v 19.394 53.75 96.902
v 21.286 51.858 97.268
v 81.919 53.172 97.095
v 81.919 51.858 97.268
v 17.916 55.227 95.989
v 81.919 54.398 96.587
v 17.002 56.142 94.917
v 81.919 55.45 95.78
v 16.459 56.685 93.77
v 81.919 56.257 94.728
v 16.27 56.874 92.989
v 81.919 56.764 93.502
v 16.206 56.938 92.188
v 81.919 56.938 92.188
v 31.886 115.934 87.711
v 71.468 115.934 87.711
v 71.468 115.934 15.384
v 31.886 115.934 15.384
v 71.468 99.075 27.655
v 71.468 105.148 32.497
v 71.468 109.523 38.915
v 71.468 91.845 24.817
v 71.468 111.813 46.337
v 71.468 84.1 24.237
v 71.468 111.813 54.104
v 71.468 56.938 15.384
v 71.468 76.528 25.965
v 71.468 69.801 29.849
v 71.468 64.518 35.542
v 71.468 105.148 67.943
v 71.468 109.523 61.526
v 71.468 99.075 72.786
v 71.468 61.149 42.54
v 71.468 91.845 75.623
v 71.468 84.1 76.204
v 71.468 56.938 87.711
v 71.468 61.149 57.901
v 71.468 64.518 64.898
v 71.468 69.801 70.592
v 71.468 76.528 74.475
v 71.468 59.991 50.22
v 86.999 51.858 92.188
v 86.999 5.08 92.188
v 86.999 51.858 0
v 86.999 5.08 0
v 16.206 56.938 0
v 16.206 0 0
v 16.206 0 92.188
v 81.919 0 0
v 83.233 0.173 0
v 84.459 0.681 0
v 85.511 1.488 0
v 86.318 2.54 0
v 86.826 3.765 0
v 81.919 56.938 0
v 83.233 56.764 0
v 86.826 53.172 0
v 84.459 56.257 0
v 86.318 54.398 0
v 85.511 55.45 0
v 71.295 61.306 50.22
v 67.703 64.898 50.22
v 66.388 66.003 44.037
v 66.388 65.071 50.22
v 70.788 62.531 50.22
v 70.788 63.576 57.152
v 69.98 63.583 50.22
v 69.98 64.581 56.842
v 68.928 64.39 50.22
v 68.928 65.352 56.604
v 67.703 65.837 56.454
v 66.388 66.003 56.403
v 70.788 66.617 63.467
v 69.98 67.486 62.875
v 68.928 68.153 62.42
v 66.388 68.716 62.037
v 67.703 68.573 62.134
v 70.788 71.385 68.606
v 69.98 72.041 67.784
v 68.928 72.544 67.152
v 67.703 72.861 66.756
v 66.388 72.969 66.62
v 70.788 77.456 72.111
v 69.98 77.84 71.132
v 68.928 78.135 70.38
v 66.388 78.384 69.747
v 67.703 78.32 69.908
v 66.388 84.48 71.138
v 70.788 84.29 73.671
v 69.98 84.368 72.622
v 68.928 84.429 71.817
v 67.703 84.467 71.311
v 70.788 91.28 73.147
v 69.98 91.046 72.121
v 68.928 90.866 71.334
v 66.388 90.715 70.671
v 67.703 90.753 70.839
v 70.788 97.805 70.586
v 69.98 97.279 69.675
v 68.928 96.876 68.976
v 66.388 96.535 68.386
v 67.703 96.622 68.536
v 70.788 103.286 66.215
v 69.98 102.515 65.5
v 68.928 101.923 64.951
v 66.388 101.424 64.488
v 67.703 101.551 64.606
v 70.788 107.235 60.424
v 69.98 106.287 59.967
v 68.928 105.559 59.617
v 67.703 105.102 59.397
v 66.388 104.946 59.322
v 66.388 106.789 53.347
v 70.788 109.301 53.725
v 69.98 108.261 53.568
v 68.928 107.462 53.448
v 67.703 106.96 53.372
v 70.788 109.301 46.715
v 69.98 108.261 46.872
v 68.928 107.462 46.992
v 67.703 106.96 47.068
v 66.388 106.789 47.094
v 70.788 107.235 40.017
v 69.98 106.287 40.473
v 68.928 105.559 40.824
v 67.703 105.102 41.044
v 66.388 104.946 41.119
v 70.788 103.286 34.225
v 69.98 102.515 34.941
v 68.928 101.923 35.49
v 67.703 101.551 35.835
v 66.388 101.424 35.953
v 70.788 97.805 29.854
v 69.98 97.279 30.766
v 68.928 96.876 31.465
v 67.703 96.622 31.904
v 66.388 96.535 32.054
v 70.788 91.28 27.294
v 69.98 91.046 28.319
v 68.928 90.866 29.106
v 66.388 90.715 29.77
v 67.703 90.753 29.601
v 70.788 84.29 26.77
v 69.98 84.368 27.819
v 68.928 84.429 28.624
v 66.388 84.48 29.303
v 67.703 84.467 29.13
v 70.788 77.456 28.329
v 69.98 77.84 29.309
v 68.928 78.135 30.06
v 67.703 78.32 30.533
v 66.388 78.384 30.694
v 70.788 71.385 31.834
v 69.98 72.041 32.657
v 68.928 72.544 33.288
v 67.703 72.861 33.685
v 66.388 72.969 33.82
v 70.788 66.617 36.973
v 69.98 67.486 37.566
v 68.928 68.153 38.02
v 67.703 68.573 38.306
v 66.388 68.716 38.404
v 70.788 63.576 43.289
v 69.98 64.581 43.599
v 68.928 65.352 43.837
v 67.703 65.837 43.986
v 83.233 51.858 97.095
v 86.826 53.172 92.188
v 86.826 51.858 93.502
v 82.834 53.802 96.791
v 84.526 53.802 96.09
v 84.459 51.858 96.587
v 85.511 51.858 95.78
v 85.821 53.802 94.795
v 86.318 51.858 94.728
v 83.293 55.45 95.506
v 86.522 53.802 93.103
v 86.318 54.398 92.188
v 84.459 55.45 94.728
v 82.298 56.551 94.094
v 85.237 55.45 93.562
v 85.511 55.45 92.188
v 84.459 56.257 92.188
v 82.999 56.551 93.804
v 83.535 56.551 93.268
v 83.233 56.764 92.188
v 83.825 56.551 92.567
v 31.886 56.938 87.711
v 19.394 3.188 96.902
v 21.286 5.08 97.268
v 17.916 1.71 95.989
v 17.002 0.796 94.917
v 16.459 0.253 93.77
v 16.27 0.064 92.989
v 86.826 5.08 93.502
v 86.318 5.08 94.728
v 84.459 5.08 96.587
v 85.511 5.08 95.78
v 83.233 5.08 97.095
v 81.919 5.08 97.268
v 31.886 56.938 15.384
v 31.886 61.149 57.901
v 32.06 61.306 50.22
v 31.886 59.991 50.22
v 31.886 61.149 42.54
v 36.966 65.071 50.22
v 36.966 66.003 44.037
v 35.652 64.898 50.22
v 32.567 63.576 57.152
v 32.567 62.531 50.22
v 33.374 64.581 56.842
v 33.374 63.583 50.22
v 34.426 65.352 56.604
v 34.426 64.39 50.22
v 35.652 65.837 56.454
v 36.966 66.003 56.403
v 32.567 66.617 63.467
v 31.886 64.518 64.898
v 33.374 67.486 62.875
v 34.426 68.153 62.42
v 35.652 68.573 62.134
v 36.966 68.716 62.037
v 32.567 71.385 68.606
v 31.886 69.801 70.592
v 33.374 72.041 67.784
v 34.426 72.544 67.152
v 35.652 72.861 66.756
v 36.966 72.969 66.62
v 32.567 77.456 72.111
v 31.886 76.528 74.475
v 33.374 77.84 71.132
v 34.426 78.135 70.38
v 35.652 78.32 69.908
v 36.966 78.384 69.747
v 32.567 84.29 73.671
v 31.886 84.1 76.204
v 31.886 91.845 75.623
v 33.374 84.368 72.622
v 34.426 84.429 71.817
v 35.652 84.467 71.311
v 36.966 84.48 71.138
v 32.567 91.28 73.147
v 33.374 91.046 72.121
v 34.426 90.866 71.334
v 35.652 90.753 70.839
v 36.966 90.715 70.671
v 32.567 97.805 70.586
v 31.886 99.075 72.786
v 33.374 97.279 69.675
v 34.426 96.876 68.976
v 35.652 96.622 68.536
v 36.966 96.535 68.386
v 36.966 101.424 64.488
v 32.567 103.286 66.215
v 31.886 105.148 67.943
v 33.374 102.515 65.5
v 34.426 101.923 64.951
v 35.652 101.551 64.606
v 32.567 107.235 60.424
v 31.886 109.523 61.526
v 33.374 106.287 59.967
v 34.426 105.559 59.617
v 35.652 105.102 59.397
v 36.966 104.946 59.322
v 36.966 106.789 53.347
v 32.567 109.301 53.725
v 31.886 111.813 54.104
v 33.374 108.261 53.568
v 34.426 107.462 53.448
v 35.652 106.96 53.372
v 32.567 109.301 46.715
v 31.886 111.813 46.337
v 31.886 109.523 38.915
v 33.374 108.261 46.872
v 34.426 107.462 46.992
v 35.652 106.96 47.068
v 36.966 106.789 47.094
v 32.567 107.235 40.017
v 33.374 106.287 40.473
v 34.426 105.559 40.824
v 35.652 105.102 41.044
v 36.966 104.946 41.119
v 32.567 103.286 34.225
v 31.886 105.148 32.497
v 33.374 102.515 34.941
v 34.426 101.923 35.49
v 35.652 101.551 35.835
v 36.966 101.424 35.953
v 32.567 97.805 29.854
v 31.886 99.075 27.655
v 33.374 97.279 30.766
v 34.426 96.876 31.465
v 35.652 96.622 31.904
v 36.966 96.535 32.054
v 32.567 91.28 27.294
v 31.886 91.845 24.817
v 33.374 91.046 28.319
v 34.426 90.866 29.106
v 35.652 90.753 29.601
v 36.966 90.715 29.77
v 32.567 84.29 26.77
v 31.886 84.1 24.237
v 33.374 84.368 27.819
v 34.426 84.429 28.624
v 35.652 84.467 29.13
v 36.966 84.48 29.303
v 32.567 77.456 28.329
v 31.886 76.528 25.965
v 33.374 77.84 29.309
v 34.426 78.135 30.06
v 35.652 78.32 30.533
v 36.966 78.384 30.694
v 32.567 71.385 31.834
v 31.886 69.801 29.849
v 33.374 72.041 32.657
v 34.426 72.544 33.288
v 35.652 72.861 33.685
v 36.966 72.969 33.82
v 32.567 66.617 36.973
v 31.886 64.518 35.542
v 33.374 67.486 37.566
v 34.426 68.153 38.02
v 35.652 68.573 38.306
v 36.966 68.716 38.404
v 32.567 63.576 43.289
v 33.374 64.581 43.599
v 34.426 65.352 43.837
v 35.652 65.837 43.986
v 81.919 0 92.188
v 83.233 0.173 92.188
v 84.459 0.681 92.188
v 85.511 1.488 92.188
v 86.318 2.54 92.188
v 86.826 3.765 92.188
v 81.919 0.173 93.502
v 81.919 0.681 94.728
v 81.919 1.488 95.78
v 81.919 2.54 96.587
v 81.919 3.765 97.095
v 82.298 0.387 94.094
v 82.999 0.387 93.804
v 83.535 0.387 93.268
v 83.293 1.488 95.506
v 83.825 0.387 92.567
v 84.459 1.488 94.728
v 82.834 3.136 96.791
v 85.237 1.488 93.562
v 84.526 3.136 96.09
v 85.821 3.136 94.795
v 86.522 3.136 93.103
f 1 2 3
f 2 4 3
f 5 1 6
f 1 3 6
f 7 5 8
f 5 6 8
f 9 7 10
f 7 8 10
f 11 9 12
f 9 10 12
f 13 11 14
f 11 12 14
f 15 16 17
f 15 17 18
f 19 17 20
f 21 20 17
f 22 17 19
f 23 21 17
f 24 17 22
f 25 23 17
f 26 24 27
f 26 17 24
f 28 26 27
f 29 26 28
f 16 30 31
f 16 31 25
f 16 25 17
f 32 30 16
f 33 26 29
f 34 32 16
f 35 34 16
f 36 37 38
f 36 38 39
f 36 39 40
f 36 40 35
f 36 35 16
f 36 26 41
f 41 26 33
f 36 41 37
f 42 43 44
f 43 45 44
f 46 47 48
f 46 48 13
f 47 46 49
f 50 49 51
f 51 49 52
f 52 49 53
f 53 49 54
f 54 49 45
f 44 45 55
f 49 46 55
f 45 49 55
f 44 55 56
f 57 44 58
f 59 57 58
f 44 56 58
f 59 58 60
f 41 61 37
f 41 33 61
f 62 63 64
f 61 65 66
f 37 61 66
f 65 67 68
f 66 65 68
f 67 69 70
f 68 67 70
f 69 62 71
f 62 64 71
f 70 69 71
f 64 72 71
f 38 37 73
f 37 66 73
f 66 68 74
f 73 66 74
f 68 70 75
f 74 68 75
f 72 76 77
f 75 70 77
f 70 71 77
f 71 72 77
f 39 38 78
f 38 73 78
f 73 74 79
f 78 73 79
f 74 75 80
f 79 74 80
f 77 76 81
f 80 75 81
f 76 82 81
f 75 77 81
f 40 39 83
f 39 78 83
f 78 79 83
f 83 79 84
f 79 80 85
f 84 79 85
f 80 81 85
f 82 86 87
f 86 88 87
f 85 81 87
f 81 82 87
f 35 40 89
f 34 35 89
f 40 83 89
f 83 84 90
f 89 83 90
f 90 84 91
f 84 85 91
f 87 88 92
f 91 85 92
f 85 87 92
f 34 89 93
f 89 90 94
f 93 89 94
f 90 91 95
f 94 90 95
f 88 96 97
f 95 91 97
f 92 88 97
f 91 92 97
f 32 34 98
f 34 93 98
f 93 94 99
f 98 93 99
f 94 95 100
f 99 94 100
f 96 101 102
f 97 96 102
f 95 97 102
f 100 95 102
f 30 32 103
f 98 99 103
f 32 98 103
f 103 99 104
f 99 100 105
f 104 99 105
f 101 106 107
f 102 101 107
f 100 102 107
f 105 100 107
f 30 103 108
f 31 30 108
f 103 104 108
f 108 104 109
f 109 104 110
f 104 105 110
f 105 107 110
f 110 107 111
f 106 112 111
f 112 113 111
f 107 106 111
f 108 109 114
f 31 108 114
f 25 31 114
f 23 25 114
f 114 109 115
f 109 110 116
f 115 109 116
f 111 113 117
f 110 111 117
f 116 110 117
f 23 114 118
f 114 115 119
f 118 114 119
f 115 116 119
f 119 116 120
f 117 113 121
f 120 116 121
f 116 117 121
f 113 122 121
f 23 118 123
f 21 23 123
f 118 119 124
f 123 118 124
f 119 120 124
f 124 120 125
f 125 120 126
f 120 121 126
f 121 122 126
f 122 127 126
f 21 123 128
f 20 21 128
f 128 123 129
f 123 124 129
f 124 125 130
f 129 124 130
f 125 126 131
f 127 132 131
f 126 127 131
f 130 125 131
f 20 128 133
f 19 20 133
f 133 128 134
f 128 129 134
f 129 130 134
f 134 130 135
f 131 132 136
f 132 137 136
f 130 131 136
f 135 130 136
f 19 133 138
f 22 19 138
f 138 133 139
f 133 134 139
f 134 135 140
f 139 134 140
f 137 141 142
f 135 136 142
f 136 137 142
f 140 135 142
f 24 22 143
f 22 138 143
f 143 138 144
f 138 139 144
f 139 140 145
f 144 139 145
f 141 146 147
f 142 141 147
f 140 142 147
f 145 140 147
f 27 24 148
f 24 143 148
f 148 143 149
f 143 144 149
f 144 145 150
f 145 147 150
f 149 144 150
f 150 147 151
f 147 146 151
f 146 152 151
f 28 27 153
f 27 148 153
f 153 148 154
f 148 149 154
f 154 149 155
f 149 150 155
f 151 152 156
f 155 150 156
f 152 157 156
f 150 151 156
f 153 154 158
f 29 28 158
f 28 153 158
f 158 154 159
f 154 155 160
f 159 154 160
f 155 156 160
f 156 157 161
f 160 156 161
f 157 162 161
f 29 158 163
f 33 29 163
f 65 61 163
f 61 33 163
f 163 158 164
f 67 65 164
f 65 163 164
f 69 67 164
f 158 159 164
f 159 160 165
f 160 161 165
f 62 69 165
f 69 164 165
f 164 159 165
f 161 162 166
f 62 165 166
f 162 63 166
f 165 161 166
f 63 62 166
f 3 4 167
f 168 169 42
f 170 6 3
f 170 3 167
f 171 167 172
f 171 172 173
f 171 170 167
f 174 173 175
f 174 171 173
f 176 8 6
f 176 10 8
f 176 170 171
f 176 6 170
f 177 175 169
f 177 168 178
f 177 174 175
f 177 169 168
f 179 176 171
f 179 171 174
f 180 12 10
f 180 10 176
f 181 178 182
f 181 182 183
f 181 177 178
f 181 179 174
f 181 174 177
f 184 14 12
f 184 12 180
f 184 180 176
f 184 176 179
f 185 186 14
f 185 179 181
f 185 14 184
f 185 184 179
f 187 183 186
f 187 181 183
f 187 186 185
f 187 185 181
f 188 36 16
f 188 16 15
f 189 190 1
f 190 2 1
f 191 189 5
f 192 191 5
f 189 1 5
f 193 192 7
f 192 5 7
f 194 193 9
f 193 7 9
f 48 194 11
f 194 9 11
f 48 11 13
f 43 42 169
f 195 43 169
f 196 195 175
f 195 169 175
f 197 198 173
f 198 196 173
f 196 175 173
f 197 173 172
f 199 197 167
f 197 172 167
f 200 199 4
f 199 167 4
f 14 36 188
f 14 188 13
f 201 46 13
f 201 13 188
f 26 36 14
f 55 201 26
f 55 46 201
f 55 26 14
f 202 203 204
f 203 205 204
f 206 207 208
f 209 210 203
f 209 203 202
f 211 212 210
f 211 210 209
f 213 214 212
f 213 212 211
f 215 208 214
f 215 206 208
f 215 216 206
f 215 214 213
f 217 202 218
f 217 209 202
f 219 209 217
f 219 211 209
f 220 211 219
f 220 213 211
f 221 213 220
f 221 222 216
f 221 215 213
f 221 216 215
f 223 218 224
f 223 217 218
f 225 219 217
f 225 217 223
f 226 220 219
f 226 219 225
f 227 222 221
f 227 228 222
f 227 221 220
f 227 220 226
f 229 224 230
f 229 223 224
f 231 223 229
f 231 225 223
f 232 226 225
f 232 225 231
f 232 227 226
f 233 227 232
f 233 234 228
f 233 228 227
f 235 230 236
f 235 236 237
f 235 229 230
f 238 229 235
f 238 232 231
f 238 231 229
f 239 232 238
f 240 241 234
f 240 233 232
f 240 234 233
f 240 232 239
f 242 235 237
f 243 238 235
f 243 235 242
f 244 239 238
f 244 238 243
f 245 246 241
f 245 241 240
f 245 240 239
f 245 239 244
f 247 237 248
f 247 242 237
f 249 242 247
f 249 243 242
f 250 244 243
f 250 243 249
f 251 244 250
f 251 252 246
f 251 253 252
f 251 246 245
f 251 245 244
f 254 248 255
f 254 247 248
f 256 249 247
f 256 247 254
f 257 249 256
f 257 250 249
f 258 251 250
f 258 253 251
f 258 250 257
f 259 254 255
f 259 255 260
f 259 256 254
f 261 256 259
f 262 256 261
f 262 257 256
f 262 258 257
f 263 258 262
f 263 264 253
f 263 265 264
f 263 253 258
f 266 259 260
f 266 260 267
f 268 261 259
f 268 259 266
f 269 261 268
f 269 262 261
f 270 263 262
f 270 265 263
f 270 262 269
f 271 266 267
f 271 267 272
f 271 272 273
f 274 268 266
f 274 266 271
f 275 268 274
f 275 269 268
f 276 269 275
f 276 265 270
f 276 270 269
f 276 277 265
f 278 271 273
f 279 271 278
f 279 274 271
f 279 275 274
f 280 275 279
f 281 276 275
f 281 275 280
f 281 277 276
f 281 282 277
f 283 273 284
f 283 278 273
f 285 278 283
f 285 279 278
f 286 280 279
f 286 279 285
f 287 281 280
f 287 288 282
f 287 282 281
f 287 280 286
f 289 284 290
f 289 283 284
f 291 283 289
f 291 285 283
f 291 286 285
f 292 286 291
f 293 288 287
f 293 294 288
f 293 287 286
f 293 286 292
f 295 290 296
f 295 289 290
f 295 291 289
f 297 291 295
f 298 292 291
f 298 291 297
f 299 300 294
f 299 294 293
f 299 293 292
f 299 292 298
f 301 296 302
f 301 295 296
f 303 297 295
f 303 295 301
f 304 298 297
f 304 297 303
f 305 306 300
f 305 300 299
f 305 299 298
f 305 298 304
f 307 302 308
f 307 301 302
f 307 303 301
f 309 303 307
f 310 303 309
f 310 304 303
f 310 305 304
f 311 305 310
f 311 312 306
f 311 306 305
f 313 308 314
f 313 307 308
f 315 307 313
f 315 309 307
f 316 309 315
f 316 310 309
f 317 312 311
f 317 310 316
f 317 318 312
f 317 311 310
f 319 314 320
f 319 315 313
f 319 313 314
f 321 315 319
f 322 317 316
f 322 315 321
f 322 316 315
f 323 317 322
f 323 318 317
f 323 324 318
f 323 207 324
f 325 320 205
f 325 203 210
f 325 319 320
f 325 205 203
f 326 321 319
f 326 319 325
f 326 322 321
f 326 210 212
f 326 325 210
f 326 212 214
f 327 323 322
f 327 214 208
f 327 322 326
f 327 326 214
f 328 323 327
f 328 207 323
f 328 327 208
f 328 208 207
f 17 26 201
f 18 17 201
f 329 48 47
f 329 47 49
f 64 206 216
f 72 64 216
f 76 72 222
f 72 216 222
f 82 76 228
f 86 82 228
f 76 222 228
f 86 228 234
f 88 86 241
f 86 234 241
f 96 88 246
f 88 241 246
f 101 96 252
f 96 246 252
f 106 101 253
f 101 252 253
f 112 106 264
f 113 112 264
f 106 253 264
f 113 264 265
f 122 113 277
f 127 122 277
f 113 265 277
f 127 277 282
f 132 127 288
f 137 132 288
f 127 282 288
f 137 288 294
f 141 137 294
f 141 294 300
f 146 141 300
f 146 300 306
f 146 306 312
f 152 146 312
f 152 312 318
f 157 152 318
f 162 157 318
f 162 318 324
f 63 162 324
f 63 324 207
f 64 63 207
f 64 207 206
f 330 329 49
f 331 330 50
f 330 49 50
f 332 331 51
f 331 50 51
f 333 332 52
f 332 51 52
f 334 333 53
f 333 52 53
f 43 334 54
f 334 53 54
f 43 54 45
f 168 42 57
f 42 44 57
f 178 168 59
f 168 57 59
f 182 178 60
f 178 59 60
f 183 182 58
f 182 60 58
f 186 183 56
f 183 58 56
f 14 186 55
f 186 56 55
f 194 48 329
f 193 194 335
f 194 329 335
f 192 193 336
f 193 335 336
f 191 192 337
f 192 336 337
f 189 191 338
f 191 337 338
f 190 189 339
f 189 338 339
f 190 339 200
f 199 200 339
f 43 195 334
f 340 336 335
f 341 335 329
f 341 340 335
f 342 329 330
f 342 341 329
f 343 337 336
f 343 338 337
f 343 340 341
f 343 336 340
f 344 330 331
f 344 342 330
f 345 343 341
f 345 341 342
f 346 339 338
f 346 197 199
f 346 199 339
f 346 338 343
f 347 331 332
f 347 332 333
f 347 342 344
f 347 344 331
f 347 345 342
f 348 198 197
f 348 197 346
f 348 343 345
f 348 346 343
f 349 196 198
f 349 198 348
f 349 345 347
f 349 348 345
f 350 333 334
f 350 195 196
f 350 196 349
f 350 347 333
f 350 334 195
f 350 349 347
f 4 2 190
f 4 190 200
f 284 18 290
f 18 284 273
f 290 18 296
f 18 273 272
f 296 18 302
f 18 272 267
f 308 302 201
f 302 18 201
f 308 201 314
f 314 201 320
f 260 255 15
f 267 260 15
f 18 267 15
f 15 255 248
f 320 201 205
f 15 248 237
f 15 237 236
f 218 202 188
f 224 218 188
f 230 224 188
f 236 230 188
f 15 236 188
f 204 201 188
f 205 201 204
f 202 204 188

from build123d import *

# Parameters (mm, degrees)
F0_W     = 70.792555
F0_H     = 56.937516
F1_DEPTH = 97.26762
F2_R     = 5.08
F3_R     = 5.08
F4_W     = 39.581746
F4_H     = 72.326273
F5_DEPTH = 58.996573
F6_R     = 20.976362
F7_DEPTH = 77.683359
F8_R     = 5.08


with BuildPart() as f1:
    # F0 (on Top) → F1 (new body)
    with BuildSketch(Plane.XY):
        with Locations((51.602363, 28.468758)):
            Rectangle(F0_W, F0_H)
    extrude(amount=F1_DEPTH)

    # F2
    f2_edges = [f1.edges().sort_by_distance(p)[0] for p in [
        (86.998641, 28.468758, 97.26762),
    ]]
    fillet(f2_edges, radius=F2_R)

    # F3
    f3_edges = [f1.edges().sort_by_distance(p)[0] for p in [
        (16.206086, 28.468758, 97.26762),
        (49.062364, 0, 97.26762),
        (49.062364, 56.937516, 97.26762),
    ]]
    fillet(f3_edges, radius=F3_R)

    # F4 (on face) → F5 (join)
    with BuildSketch(Plane(origin=(0, 56.937516, 0), x_dir=(-1, 0, 0), z_dir=(0, 1, 0))):
        with Locations((-51.677324, 51.547486)):
            Rectangle(F4_W, F4_H)
    extrude(amount=F5_DEPTH)

    # F6 (on face) → F7 (cut)
    with BuildSketch(Plane(origin=(31.886451, 0, 0), x_dir=(0, -1, 0), z_dir=(-1, 0, 0))):
        with Locations((-86.047255, 50.220259)):
            Circle(F6_R)
    extrude(amount=-F7_DEPTH, mode=Mode.SUBTRACT)

    # F8
    f8_edges = [f1.edges().sort_by_distance(p)[0] for p in [
        (71.468197, 107.023617, 50.220259),
        (31.886451, 107.023617, 50.220259),
    ]]
    fillet(f8_edges, radius=F8_R)


solid = f1.part
